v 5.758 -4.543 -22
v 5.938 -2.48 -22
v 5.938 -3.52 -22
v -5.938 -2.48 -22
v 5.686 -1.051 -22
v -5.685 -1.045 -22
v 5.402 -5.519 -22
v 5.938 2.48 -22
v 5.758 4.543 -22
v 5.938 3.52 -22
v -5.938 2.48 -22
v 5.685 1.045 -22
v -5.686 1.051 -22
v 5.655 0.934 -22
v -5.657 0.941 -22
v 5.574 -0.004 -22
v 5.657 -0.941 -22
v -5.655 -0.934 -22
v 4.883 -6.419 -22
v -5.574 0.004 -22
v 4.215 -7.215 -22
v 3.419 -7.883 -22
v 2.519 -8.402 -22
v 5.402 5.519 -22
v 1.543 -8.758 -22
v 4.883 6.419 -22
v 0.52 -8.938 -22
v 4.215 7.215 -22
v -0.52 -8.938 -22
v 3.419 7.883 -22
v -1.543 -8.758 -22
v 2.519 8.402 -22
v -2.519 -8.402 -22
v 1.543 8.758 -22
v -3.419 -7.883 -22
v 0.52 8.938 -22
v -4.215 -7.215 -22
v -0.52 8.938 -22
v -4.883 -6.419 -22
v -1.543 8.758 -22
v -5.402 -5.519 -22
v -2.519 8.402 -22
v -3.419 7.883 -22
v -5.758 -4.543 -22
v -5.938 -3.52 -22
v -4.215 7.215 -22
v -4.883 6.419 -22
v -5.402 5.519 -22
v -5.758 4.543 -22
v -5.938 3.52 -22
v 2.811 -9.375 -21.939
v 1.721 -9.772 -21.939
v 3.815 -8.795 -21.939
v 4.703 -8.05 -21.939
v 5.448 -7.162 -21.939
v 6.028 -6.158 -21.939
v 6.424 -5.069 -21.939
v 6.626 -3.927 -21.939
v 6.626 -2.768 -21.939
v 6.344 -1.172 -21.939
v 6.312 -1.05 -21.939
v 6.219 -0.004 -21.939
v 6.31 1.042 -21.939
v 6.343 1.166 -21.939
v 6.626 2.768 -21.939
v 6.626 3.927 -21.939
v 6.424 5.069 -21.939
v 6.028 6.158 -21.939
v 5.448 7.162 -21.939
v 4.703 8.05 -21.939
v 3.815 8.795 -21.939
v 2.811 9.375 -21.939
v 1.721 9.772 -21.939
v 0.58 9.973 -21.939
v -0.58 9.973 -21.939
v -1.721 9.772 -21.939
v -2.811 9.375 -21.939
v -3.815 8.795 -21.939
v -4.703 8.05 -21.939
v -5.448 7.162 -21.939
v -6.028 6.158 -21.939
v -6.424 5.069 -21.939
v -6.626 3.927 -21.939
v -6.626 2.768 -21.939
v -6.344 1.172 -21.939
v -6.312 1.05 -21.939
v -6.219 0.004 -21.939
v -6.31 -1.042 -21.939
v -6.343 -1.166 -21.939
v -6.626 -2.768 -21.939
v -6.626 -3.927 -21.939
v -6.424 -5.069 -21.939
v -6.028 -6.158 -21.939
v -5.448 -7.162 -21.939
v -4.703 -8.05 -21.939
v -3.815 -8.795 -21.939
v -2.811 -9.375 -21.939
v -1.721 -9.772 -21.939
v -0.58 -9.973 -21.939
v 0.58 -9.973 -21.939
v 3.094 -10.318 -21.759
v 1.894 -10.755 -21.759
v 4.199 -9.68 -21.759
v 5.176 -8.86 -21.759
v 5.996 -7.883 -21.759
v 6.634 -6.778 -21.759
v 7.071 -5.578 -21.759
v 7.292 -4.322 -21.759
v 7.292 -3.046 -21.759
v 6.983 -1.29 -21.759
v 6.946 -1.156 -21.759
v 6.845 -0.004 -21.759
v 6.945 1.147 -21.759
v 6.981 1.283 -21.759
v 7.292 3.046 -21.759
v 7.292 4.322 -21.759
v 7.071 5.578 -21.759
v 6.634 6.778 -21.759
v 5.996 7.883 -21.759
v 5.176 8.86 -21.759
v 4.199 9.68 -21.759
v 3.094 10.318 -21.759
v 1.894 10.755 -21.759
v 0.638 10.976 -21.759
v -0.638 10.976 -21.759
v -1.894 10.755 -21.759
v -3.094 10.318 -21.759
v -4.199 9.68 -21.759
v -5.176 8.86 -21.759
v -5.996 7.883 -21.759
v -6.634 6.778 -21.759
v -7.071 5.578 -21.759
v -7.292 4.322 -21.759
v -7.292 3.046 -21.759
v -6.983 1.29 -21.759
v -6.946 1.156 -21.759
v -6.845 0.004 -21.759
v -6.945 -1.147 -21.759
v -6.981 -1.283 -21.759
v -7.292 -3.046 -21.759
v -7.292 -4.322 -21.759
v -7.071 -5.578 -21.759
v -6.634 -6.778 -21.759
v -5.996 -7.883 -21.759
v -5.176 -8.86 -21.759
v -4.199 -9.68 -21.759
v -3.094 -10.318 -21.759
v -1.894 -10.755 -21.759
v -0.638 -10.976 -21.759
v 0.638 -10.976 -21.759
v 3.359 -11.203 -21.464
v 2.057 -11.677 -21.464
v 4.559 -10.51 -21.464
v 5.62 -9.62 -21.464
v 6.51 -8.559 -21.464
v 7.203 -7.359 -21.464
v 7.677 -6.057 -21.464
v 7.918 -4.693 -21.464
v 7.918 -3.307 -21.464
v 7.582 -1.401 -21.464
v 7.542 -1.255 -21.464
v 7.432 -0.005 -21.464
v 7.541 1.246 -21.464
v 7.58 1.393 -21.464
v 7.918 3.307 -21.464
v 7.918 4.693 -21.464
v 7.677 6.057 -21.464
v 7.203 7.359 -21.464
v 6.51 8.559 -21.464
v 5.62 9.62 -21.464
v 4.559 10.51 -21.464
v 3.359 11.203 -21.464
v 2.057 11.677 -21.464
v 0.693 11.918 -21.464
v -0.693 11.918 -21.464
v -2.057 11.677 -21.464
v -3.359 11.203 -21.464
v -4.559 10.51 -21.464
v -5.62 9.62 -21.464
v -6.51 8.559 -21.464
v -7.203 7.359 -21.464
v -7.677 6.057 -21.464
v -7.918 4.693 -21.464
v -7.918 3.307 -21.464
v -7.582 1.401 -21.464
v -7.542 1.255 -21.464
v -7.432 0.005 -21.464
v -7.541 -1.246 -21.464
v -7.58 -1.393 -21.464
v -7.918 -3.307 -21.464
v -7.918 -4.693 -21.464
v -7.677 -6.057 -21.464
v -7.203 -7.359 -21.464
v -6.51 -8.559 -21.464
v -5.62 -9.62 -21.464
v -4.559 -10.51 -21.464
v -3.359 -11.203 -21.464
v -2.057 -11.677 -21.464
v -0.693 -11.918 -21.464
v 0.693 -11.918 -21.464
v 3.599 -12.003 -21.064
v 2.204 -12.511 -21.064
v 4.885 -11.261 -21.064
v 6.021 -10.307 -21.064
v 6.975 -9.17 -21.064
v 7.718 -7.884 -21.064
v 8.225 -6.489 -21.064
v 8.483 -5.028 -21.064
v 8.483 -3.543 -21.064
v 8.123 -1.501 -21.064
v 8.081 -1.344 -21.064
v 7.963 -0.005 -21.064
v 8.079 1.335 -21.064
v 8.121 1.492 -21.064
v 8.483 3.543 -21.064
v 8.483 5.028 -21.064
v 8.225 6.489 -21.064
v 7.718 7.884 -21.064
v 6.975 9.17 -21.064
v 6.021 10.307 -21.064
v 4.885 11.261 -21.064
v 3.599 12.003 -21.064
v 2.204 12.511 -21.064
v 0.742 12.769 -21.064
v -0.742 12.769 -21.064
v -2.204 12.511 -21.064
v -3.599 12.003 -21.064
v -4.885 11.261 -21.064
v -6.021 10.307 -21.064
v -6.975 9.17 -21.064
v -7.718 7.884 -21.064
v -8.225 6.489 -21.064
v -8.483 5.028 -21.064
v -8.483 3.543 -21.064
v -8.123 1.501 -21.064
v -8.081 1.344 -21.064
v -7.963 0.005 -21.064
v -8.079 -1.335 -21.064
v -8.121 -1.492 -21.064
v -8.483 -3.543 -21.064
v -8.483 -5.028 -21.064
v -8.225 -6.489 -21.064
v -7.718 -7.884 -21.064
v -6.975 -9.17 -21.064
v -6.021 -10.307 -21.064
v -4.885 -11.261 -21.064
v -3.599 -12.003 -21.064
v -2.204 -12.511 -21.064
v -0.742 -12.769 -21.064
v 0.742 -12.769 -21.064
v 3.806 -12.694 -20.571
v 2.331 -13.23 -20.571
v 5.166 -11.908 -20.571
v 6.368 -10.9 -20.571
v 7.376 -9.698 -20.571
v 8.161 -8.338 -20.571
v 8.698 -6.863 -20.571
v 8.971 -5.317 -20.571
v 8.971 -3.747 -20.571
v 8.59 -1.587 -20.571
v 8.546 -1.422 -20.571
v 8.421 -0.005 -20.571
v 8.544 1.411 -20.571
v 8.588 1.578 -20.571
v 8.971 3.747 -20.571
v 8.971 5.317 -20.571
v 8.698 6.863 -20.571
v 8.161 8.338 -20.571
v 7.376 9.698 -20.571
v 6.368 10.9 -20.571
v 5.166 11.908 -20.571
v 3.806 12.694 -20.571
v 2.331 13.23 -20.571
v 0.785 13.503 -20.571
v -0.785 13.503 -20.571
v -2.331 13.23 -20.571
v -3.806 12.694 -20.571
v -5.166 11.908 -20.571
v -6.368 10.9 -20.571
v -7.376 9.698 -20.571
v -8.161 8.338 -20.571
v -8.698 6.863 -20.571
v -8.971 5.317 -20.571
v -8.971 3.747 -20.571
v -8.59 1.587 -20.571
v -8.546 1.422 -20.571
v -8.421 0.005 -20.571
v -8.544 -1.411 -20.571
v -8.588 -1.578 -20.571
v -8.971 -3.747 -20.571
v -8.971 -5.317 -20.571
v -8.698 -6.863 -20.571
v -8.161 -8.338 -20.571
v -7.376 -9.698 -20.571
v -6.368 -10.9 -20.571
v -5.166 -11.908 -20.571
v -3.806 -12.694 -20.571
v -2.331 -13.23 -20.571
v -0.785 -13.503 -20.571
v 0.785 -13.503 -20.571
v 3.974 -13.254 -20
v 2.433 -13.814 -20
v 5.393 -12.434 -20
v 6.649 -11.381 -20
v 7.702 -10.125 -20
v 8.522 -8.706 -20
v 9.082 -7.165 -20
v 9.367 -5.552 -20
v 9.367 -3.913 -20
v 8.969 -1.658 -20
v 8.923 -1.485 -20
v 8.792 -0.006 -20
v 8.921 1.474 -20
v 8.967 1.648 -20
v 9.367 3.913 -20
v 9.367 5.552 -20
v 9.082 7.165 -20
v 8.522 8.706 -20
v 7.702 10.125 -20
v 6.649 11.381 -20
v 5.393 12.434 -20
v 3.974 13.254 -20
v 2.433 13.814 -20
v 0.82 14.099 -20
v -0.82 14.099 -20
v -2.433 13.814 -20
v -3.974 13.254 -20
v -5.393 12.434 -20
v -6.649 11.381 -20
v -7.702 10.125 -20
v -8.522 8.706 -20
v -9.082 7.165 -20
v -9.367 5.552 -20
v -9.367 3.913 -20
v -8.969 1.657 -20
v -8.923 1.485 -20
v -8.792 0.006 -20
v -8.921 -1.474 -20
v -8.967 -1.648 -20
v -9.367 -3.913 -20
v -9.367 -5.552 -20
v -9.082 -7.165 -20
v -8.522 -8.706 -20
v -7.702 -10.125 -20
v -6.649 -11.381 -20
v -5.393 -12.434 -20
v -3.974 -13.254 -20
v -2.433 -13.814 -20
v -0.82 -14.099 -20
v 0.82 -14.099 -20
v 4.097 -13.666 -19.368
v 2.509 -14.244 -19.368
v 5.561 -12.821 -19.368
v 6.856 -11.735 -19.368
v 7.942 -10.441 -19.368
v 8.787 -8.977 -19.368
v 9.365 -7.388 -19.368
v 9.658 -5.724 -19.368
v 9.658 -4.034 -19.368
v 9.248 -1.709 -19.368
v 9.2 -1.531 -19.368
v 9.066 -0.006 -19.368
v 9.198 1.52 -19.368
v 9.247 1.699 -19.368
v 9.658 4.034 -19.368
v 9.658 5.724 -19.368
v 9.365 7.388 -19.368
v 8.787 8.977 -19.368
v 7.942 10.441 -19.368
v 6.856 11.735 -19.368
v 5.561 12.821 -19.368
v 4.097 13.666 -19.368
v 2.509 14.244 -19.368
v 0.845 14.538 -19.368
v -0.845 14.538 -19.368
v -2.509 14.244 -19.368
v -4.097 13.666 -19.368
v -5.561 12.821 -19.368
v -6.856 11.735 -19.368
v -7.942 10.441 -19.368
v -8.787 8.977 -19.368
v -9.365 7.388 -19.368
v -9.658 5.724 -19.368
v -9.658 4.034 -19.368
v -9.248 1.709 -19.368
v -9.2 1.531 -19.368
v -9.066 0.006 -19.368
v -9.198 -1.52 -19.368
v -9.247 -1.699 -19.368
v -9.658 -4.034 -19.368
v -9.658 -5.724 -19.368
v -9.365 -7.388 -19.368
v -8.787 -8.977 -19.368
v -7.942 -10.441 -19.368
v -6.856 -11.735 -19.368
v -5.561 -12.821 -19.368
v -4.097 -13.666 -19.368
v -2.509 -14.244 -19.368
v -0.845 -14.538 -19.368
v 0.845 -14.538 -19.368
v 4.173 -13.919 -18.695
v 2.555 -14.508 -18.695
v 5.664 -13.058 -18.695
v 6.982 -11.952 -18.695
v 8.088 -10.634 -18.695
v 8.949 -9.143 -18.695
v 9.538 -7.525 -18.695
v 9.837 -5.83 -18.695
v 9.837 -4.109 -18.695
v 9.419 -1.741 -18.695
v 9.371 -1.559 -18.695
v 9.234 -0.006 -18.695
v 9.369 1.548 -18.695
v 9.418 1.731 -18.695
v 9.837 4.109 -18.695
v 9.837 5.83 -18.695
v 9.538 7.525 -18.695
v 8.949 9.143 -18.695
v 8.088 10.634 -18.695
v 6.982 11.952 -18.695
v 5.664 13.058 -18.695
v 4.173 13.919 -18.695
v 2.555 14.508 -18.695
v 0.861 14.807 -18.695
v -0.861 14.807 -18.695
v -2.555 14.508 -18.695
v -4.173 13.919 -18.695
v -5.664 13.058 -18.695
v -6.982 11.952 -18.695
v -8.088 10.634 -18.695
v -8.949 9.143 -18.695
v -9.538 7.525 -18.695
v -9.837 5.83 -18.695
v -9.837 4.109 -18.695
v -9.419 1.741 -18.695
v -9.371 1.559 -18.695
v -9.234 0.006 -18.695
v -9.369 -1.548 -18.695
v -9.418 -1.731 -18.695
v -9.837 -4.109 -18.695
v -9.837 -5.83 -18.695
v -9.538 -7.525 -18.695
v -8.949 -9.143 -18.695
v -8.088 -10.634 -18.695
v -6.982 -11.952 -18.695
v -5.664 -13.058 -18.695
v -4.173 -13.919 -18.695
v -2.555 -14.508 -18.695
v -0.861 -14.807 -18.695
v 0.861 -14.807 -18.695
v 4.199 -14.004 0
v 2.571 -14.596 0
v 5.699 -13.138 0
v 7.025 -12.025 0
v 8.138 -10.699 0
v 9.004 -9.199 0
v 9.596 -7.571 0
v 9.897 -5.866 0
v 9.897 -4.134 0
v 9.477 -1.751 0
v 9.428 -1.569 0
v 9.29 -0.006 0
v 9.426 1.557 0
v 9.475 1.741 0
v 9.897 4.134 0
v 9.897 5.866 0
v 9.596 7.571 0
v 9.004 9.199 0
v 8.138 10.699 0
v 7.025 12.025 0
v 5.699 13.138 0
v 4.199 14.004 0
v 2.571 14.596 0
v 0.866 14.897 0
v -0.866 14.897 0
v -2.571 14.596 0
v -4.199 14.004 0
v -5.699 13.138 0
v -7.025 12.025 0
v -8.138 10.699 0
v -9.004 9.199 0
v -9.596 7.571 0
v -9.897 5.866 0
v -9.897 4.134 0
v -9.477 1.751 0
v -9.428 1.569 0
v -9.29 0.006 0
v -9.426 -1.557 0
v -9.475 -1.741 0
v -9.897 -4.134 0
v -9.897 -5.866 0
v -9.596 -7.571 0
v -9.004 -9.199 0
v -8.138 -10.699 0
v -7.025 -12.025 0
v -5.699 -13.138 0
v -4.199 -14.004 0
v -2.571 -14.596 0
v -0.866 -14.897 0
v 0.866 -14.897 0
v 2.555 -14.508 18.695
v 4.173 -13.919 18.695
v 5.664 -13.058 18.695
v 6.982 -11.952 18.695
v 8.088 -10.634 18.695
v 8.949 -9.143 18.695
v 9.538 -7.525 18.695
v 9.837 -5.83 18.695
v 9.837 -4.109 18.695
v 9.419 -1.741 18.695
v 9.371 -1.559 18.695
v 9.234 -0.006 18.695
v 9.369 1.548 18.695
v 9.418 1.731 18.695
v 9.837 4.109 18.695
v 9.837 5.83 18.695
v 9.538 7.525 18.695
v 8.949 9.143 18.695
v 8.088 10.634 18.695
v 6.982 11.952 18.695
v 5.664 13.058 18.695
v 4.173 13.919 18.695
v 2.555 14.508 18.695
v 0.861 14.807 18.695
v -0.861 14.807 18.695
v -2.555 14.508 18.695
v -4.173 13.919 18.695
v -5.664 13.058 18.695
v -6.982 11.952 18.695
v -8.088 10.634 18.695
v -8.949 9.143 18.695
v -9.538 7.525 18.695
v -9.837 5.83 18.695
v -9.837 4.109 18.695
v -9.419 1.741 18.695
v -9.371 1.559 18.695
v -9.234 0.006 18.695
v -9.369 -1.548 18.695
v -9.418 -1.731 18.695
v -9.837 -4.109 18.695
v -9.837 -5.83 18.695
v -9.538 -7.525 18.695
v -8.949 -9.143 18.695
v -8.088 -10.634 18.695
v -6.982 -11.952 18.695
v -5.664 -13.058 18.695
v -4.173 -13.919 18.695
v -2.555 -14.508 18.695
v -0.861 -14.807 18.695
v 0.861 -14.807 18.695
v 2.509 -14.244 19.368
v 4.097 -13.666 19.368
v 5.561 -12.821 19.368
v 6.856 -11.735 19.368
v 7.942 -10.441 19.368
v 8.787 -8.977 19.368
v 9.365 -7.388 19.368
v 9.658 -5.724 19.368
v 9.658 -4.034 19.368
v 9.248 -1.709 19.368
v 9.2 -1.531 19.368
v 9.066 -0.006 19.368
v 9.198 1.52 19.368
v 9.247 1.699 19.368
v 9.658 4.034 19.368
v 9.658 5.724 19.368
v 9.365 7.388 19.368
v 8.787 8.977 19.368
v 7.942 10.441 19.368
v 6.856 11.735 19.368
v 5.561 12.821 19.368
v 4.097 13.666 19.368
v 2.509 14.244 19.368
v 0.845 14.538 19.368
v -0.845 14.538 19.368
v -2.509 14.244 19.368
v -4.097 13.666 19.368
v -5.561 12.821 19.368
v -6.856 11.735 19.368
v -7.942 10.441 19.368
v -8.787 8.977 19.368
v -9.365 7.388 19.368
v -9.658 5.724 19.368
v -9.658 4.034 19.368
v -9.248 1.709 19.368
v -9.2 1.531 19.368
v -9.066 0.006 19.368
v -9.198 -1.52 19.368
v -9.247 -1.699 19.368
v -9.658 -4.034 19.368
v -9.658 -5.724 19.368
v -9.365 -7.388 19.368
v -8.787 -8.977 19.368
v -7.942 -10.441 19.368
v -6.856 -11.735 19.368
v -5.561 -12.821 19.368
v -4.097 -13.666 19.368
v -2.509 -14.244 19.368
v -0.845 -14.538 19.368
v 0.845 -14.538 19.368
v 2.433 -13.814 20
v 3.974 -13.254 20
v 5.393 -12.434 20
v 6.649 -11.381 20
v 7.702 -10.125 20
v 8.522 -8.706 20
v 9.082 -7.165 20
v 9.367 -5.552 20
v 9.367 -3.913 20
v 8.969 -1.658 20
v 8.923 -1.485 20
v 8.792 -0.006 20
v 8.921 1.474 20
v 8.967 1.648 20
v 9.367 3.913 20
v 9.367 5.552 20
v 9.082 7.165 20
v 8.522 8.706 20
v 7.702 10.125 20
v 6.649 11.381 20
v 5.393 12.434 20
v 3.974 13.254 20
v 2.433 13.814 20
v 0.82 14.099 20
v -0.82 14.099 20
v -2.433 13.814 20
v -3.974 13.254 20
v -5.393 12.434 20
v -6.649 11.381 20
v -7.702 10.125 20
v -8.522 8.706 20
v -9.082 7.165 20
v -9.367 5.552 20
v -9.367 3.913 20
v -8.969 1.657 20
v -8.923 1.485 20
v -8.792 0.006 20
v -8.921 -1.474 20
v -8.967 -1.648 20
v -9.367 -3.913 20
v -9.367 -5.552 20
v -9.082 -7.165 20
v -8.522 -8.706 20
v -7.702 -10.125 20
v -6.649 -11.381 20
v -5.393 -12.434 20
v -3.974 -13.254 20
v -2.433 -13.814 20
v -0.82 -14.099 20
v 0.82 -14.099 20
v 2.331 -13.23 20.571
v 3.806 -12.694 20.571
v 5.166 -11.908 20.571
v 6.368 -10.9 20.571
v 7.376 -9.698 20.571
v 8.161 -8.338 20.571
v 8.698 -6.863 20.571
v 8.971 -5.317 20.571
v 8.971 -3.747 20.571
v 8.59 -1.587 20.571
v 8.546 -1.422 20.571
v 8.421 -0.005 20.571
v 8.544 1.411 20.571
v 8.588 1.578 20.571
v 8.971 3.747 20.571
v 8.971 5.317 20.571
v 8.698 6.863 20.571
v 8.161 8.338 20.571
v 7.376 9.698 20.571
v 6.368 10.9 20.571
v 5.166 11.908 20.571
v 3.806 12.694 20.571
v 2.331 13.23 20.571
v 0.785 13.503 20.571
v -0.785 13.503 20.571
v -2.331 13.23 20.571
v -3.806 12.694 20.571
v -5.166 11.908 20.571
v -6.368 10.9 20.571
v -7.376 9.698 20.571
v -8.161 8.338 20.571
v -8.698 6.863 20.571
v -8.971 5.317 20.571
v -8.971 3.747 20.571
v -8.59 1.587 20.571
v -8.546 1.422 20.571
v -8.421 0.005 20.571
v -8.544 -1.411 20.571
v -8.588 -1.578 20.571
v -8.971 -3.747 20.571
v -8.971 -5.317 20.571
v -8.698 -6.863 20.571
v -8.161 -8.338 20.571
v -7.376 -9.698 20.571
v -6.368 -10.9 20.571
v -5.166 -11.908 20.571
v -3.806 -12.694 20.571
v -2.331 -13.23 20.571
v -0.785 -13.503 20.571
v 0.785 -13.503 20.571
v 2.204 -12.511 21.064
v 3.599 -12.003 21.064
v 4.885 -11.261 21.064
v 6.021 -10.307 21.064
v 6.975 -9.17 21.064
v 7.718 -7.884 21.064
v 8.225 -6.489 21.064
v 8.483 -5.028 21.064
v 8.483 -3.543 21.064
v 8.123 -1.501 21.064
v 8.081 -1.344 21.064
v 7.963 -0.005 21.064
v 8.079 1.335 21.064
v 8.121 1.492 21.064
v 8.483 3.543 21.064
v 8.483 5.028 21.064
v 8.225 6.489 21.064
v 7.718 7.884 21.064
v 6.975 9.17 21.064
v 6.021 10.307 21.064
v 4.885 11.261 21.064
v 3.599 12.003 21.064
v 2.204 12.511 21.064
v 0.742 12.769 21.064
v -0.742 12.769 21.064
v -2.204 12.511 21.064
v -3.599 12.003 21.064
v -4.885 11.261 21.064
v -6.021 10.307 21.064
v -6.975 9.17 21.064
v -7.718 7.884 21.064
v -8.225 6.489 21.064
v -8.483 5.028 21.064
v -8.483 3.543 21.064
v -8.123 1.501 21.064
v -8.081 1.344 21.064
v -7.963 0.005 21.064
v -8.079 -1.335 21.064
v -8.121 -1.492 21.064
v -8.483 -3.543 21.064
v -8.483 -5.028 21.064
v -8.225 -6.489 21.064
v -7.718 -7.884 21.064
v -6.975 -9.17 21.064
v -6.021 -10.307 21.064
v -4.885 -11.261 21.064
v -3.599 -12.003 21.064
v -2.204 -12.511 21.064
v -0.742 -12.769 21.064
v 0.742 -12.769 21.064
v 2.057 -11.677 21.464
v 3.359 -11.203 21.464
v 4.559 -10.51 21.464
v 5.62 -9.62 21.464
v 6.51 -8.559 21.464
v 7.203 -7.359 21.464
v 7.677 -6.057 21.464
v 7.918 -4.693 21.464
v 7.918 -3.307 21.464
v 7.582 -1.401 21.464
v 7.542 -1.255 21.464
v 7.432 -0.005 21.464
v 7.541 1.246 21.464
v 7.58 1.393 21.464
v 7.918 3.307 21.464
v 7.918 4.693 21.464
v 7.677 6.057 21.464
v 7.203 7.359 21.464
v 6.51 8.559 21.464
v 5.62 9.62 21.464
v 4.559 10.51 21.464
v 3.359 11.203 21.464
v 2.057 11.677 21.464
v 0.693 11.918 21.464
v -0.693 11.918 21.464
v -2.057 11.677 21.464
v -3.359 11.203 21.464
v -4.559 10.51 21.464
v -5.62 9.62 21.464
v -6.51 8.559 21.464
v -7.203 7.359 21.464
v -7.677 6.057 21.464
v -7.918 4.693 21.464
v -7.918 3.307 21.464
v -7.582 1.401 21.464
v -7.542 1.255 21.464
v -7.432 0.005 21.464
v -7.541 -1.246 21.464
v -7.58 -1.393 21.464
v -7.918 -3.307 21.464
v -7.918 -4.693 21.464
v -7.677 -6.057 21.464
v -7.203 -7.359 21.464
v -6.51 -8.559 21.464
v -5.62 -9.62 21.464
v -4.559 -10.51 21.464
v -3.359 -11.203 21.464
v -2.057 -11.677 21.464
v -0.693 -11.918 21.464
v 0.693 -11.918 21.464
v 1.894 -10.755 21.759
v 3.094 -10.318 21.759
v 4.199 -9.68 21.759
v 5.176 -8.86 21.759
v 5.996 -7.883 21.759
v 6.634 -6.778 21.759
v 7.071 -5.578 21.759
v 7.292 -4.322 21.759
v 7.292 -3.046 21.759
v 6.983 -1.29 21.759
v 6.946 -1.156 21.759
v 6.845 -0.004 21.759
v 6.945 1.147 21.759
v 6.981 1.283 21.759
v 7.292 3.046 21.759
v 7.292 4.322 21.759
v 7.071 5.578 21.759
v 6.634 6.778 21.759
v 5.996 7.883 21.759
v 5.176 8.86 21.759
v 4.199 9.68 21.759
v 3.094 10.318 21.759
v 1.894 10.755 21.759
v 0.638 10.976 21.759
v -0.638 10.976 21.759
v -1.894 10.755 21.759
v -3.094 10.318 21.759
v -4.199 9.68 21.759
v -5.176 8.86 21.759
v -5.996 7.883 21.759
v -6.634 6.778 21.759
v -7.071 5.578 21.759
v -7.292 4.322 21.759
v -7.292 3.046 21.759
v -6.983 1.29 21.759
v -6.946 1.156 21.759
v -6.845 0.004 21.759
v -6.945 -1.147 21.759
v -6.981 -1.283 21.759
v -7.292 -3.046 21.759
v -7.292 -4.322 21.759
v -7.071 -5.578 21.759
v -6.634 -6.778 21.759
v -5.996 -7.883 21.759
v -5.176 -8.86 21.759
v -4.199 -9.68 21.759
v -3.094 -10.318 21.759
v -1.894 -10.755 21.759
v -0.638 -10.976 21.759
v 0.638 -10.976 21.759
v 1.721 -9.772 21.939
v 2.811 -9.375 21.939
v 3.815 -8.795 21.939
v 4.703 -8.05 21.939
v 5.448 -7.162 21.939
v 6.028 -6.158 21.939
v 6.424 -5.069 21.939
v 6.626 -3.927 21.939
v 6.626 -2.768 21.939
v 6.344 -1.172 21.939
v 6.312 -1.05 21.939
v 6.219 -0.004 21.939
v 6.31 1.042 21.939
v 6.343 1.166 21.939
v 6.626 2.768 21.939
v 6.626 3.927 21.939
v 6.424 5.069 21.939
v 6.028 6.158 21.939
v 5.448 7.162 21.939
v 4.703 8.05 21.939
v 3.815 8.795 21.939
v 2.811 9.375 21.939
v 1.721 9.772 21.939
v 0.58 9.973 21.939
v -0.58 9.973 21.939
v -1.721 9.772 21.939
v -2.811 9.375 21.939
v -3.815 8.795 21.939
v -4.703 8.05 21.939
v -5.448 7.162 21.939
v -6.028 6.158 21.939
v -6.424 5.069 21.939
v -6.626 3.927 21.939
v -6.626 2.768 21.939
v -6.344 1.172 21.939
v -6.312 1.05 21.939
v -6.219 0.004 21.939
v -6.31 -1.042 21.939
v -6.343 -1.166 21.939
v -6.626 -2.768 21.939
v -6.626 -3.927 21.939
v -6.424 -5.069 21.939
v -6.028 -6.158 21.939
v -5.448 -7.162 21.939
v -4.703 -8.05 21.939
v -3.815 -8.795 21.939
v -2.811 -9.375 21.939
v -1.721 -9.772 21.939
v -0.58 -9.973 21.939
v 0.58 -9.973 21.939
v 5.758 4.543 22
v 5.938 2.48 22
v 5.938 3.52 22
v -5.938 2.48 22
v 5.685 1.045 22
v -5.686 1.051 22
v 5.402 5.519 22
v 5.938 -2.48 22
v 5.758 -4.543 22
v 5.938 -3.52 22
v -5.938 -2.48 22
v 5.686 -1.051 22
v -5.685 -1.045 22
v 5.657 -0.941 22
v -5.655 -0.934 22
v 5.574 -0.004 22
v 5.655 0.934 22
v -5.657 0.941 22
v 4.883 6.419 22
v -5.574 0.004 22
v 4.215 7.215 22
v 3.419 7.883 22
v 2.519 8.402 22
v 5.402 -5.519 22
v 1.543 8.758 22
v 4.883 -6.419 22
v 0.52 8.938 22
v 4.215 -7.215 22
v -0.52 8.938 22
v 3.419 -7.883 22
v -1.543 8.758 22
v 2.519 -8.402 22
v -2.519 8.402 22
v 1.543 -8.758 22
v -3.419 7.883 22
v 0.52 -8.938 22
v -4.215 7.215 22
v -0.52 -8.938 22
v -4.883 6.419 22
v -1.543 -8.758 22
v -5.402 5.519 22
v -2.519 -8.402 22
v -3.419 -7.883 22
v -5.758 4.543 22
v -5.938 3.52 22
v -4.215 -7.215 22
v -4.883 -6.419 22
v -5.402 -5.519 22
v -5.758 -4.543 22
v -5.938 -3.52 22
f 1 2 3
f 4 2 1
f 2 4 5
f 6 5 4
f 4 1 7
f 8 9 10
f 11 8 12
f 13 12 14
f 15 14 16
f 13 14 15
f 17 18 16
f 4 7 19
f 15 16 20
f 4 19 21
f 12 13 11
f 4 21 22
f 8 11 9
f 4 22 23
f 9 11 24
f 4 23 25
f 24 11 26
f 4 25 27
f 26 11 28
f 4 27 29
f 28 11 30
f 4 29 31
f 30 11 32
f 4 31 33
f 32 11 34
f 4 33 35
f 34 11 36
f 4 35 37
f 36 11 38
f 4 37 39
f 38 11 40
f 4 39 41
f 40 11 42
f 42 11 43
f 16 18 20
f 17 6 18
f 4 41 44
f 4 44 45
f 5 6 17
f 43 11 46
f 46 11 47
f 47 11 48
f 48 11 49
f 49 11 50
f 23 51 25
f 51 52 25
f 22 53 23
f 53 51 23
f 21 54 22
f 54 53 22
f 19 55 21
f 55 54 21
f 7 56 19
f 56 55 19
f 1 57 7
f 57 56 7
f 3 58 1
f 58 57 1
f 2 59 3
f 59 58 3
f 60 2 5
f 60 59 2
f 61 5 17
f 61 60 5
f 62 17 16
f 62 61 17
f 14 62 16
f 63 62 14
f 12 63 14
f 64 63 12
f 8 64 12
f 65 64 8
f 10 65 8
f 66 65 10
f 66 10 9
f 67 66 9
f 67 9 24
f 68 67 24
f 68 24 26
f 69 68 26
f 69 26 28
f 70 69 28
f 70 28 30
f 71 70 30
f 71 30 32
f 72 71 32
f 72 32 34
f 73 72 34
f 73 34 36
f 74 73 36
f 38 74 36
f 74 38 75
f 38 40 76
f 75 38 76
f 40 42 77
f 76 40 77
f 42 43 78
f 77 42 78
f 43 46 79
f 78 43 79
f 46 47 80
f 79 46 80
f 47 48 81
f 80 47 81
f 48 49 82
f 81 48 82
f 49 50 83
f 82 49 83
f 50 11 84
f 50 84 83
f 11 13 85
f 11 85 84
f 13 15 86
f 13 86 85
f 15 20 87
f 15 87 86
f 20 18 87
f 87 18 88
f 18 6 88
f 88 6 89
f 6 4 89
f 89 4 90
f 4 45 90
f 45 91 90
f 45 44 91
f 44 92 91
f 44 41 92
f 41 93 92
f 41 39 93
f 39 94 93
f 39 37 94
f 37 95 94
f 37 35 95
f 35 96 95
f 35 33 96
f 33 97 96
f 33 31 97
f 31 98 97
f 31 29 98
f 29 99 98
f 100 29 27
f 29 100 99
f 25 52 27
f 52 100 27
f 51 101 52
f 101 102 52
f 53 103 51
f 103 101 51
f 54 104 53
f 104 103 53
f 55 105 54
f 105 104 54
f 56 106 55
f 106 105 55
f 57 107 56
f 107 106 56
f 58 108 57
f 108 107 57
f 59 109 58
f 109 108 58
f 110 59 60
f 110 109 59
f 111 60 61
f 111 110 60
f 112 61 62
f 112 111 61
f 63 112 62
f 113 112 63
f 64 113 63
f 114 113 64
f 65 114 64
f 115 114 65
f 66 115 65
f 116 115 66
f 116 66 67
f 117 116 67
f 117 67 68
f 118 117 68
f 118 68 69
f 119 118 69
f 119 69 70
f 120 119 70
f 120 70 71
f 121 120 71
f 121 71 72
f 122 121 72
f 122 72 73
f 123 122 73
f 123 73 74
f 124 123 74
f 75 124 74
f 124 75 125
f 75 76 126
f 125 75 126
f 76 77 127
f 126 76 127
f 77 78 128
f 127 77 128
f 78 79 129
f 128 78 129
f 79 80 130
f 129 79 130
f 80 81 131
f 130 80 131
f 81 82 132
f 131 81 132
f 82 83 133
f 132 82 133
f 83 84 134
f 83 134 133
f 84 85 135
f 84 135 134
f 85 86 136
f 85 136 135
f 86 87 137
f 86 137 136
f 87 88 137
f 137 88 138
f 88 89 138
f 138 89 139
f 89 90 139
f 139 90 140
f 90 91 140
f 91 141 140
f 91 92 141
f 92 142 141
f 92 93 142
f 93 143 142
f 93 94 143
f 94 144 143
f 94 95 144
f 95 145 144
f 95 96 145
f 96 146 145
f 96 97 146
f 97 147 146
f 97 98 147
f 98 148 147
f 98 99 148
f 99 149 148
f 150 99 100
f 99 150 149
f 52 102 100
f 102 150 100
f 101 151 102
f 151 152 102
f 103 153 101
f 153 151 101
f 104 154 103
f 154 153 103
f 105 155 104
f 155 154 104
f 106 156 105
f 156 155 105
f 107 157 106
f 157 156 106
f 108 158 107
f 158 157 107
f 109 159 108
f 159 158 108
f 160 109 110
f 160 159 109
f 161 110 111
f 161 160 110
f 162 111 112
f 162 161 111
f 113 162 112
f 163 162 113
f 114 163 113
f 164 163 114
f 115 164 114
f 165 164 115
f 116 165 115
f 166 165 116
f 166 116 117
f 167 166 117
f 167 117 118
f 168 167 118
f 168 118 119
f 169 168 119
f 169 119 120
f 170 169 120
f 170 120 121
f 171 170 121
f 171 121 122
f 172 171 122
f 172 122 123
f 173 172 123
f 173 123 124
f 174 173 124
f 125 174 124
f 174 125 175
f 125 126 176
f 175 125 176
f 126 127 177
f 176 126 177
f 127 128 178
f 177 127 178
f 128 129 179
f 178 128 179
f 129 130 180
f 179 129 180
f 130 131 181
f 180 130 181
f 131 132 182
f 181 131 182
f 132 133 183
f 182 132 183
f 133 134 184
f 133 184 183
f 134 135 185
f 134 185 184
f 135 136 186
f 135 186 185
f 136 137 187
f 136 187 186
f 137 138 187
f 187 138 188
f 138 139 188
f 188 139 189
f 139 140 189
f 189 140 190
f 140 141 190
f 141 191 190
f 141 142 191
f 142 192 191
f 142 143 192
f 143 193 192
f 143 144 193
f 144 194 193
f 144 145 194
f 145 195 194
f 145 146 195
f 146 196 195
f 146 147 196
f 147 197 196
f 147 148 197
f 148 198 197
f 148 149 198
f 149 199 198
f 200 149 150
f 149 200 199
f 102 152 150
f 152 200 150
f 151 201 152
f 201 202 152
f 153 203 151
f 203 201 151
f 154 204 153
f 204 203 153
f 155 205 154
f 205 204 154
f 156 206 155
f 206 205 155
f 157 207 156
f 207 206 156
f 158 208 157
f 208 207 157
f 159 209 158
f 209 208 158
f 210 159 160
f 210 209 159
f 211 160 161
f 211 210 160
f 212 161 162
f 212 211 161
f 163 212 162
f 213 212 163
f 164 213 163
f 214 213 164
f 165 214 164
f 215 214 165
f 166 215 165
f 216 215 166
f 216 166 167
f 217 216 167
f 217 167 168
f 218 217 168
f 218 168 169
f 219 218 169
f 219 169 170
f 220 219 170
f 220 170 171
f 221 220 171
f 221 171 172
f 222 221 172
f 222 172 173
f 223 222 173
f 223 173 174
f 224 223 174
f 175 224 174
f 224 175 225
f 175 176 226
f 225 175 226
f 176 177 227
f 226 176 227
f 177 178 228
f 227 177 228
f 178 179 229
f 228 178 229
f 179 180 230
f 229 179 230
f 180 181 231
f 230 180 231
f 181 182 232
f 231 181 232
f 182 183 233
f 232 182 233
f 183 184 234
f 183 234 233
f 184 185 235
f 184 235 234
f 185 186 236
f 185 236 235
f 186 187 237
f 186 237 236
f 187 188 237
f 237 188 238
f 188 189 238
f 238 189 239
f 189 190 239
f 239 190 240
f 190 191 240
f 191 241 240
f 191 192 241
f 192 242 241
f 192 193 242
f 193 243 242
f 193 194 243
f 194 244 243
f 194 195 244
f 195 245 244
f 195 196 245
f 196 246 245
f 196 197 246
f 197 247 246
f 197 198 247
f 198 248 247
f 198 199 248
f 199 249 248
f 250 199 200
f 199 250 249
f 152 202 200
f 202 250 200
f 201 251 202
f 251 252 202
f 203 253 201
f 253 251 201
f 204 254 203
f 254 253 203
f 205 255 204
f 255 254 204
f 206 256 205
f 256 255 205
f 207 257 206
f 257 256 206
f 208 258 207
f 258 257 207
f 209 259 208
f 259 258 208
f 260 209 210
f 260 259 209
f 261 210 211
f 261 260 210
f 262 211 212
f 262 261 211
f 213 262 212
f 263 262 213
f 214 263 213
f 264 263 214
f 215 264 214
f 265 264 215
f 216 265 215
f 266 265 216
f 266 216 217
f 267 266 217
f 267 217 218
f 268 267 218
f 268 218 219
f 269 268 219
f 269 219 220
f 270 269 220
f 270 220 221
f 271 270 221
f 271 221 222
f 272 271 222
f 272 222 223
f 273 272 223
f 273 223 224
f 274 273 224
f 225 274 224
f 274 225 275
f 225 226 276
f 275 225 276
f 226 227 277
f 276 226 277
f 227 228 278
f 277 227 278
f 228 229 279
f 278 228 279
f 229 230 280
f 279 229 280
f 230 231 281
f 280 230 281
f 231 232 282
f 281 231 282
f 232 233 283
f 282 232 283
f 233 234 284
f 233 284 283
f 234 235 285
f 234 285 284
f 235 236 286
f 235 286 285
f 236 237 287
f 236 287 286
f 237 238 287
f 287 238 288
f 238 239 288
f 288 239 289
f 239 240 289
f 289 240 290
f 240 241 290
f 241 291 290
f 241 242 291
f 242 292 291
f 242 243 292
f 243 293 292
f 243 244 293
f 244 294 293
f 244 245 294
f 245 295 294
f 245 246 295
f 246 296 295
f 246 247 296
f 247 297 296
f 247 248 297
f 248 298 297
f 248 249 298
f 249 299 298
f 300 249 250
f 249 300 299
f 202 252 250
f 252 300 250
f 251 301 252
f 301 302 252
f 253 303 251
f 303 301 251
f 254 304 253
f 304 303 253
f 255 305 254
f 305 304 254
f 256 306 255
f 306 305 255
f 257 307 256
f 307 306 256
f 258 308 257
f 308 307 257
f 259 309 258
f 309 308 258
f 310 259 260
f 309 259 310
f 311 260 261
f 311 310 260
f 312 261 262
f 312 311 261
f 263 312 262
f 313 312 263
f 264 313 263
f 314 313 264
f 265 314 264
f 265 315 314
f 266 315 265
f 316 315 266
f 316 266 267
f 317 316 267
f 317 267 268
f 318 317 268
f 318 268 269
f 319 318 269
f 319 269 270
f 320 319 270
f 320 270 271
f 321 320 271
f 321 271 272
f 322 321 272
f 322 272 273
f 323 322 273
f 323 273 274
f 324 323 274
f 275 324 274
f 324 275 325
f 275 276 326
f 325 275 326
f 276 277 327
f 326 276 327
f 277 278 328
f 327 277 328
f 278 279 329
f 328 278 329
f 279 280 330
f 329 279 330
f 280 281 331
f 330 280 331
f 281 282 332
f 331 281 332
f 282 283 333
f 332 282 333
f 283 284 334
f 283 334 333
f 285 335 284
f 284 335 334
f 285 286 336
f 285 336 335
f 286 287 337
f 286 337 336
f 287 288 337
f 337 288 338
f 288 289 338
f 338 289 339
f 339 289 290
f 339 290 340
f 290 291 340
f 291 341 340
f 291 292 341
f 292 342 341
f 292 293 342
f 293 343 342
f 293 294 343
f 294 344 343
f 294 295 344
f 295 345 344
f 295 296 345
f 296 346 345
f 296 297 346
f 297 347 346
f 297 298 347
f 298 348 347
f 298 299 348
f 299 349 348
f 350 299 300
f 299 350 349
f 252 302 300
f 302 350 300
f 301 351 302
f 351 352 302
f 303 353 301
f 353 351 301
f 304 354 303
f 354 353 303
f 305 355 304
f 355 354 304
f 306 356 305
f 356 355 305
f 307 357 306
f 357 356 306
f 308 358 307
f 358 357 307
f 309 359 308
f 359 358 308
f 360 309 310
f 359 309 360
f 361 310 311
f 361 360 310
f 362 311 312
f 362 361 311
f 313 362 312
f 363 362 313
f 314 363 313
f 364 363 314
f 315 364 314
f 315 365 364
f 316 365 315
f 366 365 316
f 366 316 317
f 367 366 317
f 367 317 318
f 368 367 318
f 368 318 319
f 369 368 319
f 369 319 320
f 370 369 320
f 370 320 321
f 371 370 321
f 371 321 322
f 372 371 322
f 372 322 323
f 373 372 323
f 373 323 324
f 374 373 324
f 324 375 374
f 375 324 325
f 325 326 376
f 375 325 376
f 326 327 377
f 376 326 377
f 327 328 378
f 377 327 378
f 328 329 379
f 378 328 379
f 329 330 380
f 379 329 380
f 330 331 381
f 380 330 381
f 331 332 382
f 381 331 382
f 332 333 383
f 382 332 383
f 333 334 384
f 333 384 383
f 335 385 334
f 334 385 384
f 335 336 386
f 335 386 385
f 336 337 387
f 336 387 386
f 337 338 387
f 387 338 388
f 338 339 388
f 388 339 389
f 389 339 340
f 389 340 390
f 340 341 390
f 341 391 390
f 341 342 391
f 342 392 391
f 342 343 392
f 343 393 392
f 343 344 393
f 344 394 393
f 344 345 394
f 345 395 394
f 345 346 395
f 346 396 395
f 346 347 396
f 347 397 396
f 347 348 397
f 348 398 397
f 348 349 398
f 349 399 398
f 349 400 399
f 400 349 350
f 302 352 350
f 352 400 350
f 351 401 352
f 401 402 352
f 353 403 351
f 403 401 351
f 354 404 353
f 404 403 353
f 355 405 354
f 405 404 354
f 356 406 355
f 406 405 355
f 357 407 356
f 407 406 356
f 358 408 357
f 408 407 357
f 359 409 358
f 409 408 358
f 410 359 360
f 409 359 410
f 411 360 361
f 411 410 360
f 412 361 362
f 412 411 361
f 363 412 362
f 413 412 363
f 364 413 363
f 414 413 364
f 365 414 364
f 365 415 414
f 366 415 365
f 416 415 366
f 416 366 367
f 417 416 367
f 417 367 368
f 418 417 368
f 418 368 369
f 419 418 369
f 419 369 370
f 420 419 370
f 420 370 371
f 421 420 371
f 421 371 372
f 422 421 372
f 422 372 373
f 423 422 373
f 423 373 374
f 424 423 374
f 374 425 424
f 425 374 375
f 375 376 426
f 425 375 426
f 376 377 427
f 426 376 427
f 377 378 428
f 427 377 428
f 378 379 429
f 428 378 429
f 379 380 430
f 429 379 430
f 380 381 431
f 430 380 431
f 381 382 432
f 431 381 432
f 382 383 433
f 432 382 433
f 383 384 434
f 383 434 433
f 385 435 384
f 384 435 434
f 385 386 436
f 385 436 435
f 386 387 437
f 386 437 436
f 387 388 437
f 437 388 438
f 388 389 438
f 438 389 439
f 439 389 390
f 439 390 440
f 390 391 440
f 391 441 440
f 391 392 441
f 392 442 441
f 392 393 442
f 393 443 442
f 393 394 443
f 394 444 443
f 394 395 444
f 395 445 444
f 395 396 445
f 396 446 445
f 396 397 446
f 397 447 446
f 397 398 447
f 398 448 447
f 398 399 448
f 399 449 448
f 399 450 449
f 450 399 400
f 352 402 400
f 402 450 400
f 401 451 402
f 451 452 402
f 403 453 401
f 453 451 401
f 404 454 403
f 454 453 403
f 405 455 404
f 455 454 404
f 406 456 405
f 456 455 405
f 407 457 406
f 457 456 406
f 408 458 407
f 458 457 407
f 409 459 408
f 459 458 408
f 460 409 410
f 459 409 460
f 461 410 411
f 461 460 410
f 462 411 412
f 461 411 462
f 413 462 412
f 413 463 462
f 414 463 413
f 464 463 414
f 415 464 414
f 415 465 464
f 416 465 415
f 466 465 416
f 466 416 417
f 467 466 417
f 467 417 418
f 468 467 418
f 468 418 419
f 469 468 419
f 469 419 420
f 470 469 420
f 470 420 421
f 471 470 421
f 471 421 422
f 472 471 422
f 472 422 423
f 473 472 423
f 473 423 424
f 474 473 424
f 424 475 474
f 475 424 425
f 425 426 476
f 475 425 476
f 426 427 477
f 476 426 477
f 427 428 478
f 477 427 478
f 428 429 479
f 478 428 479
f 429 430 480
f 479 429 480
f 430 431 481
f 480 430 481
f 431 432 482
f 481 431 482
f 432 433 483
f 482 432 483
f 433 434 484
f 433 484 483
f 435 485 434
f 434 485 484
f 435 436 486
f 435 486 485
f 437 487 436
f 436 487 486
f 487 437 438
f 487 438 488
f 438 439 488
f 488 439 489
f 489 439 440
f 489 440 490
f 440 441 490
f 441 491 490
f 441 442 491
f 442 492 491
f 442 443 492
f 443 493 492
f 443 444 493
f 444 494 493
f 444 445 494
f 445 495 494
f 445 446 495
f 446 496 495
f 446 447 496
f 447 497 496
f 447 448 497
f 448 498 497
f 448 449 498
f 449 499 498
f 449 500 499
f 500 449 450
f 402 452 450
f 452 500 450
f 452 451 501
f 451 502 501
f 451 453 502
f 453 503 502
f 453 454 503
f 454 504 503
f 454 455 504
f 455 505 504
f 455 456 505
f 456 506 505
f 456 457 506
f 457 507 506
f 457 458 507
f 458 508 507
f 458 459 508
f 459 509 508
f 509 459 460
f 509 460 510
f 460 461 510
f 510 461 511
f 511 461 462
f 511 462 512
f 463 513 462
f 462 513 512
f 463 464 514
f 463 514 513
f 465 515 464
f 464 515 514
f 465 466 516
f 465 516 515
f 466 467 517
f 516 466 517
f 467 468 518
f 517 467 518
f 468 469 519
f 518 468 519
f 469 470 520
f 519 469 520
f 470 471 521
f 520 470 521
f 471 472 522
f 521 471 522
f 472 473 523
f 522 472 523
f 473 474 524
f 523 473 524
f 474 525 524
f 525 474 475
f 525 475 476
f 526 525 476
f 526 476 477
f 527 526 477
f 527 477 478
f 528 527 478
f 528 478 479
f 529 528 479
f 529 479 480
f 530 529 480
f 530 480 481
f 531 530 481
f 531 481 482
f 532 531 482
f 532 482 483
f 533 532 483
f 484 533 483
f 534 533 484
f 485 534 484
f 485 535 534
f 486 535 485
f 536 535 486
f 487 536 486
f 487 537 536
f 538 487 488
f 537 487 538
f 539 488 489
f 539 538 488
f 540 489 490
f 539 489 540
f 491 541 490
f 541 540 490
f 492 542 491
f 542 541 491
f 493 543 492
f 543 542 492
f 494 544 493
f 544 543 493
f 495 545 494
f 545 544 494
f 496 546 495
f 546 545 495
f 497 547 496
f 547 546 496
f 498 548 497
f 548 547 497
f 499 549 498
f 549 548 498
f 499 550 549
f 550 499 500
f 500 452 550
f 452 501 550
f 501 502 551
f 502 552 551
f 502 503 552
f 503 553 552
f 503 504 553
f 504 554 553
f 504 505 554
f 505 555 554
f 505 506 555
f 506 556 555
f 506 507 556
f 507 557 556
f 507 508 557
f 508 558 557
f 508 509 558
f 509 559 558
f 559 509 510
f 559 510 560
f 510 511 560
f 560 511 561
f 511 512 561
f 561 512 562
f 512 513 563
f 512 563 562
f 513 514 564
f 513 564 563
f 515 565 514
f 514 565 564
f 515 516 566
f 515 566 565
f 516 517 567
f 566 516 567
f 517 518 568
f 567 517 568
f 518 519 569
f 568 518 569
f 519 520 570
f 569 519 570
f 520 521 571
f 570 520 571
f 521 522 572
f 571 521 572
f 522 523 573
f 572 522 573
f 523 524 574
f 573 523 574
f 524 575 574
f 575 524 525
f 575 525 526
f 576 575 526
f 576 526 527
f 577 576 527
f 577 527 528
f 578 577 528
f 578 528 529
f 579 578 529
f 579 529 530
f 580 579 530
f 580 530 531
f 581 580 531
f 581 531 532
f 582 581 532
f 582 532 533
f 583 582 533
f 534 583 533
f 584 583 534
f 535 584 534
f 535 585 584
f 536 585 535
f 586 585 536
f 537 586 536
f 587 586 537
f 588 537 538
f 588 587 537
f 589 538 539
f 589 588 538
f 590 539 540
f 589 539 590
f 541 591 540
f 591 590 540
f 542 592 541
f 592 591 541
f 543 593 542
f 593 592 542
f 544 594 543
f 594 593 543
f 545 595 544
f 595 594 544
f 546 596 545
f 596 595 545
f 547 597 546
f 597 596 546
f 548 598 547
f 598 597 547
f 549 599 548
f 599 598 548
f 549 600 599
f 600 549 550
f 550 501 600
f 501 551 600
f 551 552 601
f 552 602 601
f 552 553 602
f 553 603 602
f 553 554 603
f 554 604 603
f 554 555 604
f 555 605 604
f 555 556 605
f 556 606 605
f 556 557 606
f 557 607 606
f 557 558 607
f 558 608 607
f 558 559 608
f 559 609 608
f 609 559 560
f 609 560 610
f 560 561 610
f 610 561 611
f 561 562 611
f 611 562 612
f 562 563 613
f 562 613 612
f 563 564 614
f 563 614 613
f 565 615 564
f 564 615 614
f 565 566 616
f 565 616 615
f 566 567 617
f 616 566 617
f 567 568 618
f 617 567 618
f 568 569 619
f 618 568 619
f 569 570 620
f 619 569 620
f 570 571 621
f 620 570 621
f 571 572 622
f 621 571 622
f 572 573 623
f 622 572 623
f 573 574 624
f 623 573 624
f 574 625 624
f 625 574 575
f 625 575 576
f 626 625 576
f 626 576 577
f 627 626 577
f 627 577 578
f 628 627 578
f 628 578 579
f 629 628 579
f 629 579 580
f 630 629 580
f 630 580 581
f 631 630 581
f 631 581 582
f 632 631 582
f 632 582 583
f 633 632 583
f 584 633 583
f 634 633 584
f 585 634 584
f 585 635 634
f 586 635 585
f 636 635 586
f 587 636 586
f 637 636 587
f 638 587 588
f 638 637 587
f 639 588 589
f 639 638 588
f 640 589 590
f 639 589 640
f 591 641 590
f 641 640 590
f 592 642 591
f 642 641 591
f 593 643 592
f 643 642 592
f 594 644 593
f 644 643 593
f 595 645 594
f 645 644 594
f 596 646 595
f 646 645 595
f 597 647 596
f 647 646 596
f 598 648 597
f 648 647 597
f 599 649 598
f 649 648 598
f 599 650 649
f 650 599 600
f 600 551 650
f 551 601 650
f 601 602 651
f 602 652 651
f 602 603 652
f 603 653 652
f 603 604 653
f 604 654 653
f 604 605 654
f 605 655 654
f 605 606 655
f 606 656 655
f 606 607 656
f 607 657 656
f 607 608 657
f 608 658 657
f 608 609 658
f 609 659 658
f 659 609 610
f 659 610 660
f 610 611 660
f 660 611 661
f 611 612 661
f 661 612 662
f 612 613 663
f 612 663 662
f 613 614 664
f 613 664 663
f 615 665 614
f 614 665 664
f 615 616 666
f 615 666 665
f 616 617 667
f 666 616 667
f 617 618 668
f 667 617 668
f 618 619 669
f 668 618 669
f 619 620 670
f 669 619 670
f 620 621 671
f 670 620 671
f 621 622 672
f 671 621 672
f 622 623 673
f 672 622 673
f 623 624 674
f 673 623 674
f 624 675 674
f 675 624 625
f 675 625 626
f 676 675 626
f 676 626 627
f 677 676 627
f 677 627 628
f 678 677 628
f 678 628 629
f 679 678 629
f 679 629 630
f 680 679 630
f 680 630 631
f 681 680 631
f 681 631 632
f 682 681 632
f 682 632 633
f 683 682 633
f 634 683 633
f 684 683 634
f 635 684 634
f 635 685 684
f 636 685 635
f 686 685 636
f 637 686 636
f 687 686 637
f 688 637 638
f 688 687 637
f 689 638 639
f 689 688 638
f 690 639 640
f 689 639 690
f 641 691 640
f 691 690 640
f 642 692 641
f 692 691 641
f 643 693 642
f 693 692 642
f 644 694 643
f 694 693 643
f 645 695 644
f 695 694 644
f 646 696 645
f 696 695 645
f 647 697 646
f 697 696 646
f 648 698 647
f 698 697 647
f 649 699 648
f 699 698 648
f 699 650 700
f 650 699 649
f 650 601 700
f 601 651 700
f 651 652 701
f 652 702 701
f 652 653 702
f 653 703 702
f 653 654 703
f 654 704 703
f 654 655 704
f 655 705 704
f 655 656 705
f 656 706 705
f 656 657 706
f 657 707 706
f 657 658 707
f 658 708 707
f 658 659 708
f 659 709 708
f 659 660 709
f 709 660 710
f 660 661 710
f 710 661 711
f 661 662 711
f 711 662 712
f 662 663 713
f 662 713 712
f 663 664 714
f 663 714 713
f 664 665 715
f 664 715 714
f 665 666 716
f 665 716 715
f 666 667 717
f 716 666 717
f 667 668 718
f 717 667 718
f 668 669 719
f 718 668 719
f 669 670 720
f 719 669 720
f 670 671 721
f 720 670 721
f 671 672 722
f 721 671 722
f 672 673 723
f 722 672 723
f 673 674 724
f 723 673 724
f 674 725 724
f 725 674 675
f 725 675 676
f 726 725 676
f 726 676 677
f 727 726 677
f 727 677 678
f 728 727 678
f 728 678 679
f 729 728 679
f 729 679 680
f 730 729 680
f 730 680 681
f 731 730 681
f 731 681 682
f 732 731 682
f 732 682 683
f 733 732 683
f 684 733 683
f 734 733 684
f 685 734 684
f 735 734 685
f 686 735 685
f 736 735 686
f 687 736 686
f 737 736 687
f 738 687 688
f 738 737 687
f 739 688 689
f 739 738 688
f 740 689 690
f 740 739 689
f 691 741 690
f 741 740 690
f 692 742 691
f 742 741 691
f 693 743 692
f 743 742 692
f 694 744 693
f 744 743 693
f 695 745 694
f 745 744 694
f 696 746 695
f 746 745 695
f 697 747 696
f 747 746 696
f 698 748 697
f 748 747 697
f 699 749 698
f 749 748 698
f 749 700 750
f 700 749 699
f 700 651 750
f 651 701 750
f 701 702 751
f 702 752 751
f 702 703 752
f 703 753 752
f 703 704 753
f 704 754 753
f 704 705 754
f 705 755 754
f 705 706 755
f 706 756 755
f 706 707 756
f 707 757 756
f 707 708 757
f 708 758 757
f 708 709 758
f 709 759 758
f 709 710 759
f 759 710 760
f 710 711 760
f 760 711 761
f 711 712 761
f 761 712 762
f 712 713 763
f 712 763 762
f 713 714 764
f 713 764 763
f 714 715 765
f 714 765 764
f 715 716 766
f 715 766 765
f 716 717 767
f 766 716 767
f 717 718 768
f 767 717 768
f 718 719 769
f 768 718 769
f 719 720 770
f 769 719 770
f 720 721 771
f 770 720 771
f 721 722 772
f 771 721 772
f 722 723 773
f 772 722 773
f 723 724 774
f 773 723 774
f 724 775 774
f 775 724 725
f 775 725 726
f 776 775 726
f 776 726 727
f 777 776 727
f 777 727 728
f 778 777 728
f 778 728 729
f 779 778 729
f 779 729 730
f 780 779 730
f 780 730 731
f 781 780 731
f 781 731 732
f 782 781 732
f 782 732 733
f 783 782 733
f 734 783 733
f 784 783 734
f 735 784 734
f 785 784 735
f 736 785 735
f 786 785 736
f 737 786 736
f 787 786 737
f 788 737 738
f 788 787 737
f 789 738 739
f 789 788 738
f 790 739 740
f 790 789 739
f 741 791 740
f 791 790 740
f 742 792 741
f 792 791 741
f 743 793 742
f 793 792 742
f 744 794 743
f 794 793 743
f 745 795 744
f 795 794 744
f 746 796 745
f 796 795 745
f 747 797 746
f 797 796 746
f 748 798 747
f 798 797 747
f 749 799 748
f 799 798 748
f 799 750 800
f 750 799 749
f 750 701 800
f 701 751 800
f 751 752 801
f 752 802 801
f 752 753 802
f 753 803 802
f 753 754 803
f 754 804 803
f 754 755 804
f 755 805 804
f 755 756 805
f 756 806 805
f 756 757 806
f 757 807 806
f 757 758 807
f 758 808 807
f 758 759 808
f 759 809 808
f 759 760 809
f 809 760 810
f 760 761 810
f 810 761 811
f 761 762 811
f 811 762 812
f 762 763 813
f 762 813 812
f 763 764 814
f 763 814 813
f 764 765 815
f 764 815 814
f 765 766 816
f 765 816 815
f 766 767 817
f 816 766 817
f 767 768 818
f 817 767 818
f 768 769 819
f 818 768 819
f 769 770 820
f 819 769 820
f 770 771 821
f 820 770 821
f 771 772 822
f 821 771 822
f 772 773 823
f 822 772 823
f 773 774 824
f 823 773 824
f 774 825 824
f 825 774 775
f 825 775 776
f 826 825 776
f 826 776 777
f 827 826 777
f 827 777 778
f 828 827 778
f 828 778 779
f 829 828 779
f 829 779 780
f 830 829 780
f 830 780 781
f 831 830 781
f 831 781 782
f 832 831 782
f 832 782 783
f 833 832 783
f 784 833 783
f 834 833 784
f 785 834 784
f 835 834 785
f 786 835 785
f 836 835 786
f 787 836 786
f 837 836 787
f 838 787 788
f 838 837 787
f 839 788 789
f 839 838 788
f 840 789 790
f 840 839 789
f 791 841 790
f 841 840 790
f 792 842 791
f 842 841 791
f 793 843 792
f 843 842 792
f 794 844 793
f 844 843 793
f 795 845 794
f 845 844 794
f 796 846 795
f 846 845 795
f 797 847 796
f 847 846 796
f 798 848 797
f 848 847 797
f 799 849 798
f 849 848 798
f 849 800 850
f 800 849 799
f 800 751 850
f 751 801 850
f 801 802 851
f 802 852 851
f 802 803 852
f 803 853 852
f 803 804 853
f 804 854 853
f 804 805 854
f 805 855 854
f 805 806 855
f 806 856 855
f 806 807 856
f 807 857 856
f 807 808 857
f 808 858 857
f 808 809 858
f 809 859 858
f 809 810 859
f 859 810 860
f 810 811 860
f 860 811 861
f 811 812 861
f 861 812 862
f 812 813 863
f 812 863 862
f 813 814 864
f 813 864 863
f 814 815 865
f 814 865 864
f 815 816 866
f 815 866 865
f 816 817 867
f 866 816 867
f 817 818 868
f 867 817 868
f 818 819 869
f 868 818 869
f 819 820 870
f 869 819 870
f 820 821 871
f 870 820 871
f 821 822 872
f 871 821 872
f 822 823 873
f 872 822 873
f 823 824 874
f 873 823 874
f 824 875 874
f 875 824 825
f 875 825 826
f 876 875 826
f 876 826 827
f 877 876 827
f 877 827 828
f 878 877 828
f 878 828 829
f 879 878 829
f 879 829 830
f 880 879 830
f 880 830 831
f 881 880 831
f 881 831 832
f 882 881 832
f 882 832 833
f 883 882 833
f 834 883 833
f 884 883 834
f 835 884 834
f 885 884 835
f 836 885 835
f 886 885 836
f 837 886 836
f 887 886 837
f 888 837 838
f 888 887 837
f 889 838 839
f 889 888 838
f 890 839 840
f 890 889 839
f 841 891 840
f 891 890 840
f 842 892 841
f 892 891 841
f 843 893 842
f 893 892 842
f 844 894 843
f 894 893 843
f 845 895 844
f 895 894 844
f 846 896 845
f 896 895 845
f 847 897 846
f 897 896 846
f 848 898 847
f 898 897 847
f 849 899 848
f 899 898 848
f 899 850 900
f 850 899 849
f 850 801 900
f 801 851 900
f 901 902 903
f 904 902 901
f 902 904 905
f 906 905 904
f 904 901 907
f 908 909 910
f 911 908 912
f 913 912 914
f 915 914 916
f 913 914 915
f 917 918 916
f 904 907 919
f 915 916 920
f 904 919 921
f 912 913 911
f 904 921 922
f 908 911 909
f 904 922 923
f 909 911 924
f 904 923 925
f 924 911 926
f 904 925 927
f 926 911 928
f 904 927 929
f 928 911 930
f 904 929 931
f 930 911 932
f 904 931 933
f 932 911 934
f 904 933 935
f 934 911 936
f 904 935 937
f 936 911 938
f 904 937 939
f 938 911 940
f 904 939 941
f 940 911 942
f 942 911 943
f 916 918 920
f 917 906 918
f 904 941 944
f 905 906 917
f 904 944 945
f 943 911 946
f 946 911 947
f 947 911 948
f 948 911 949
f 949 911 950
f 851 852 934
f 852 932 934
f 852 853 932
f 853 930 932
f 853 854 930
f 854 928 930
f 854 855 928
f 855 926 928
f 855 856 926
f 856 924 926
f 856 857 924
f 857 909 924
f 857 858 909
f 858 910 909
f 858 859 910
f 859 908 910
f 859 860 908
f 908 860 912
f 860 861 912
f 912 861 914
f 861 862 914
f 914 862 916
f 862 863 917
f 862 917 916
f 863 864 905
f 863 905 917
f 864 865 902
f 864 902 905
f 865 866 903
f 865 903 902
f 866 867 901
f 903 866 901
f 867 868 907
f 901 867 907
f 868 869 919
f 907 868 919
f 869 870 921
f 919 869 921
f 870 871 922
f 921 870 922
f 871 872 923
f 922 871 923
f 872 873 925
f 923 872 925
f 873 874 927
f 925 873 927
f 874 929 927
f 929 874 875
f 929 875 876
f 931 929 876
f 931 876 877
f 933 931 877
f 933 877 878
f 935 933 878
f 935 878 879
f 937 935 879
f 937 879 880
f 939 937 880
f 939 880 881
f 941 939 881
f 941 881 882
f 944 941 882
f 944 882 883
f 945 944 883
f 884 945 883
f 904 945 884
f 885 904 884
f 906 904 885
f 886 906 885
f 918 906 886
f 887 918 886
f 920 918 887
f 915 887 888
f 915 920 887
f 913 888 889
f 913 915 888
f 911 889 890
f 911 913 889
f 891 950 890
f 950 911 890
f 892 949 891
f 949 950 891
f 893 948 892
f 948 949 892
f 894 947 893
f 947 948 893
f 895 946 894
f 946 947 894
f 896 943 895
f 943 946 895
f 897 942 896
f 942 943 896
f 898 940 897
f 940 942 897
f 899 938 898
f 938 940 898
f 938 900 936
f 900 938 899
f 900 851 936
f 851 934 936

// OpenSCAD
$fn=36;


maxp=10;
r=4;
h=40;
v= 
[for(i=[-90:10:90])
 duax( ((maxp-r)+abs(cos(i))*r)/maxp,sign(i)*(h-r)/2+ sin(i)*r )

]
 
 ;

echo (v.x);
echo (v.y);
//echo (v.z);
express(v){
    r=9;
    offset(-r)offset(r*2)    offset(-r){
translate([0,5])circle(10);
translate([0,-5])circle(10);
}}
function duax(a,b)=[a,a,b];
//function wrapi(x,tak) =  ((x  % tak) + tak) % tak; // wraps index 0 - x 
// 
//function lerp( v1, v2, bias) = (1-bias)*v1 + bias*v2;
//
//function smooth_animate(t,v)=let(
//ll=len(v),        i=round(ll*t),       T= ((ll*t+0.5)%1) , 
//p0=    lerp(v[ wrapi(i-1,ll)], v[wrapi(i,ll)],0.5),
//p1=    v[wrapi(i,len(v))], 
//p2=    lerp( v[wrapi(i,ll)],v[ wrapi(i+1,ll)],0.5) ) 
//lerp(lerp( p0,p1,T),lerp(p1,p2,T),(T)) ;
// 
//function i(v,l=10)=[for(n=[0:1/l:1])listlerp (v,n*(len(v)-1))];
//function s(vi,c=2)=c>0?let(v=s(vi,c-1))[for(i=[0:len(v)-1])( v[i]+v[max(0,i-1)]+v[min(len(v)-1,i+1)])/3]:vi;
//function listlerp (l,I)=
//let(f=len(l)-1,start=max(0,min(f,floor(I))),end=max(0,min(f,ceil(I))),bias=smooth(I%1)) (l[end]* bias + l[start] * (1 - bias));
//function smooth (a) =
//let (b =max(0, min(1,a)))(b * b * (3 - 2 * b));
 
 
module express(v){
 
    
    for(i=[0:len(v)-2])
{
translate([0,0,v[i].z])

linear_extrude(
    v[i+1].z -v[i].z,
    scale=[max(0.000001, v[i+1].x /v[i].x ), max(0.000001, v[i+1].y /v[i].y )] ,
    slices= (v[i+1].z -v[i].z)/10
//  ,  twist =(v[rotations][i+1] -v[rotations][i])
    )
//rotate([0,0,v[rotations][i]])
scale([max(0.000001,v[i].x),max(0.0000001,v[i].y)] )
children();
}}
